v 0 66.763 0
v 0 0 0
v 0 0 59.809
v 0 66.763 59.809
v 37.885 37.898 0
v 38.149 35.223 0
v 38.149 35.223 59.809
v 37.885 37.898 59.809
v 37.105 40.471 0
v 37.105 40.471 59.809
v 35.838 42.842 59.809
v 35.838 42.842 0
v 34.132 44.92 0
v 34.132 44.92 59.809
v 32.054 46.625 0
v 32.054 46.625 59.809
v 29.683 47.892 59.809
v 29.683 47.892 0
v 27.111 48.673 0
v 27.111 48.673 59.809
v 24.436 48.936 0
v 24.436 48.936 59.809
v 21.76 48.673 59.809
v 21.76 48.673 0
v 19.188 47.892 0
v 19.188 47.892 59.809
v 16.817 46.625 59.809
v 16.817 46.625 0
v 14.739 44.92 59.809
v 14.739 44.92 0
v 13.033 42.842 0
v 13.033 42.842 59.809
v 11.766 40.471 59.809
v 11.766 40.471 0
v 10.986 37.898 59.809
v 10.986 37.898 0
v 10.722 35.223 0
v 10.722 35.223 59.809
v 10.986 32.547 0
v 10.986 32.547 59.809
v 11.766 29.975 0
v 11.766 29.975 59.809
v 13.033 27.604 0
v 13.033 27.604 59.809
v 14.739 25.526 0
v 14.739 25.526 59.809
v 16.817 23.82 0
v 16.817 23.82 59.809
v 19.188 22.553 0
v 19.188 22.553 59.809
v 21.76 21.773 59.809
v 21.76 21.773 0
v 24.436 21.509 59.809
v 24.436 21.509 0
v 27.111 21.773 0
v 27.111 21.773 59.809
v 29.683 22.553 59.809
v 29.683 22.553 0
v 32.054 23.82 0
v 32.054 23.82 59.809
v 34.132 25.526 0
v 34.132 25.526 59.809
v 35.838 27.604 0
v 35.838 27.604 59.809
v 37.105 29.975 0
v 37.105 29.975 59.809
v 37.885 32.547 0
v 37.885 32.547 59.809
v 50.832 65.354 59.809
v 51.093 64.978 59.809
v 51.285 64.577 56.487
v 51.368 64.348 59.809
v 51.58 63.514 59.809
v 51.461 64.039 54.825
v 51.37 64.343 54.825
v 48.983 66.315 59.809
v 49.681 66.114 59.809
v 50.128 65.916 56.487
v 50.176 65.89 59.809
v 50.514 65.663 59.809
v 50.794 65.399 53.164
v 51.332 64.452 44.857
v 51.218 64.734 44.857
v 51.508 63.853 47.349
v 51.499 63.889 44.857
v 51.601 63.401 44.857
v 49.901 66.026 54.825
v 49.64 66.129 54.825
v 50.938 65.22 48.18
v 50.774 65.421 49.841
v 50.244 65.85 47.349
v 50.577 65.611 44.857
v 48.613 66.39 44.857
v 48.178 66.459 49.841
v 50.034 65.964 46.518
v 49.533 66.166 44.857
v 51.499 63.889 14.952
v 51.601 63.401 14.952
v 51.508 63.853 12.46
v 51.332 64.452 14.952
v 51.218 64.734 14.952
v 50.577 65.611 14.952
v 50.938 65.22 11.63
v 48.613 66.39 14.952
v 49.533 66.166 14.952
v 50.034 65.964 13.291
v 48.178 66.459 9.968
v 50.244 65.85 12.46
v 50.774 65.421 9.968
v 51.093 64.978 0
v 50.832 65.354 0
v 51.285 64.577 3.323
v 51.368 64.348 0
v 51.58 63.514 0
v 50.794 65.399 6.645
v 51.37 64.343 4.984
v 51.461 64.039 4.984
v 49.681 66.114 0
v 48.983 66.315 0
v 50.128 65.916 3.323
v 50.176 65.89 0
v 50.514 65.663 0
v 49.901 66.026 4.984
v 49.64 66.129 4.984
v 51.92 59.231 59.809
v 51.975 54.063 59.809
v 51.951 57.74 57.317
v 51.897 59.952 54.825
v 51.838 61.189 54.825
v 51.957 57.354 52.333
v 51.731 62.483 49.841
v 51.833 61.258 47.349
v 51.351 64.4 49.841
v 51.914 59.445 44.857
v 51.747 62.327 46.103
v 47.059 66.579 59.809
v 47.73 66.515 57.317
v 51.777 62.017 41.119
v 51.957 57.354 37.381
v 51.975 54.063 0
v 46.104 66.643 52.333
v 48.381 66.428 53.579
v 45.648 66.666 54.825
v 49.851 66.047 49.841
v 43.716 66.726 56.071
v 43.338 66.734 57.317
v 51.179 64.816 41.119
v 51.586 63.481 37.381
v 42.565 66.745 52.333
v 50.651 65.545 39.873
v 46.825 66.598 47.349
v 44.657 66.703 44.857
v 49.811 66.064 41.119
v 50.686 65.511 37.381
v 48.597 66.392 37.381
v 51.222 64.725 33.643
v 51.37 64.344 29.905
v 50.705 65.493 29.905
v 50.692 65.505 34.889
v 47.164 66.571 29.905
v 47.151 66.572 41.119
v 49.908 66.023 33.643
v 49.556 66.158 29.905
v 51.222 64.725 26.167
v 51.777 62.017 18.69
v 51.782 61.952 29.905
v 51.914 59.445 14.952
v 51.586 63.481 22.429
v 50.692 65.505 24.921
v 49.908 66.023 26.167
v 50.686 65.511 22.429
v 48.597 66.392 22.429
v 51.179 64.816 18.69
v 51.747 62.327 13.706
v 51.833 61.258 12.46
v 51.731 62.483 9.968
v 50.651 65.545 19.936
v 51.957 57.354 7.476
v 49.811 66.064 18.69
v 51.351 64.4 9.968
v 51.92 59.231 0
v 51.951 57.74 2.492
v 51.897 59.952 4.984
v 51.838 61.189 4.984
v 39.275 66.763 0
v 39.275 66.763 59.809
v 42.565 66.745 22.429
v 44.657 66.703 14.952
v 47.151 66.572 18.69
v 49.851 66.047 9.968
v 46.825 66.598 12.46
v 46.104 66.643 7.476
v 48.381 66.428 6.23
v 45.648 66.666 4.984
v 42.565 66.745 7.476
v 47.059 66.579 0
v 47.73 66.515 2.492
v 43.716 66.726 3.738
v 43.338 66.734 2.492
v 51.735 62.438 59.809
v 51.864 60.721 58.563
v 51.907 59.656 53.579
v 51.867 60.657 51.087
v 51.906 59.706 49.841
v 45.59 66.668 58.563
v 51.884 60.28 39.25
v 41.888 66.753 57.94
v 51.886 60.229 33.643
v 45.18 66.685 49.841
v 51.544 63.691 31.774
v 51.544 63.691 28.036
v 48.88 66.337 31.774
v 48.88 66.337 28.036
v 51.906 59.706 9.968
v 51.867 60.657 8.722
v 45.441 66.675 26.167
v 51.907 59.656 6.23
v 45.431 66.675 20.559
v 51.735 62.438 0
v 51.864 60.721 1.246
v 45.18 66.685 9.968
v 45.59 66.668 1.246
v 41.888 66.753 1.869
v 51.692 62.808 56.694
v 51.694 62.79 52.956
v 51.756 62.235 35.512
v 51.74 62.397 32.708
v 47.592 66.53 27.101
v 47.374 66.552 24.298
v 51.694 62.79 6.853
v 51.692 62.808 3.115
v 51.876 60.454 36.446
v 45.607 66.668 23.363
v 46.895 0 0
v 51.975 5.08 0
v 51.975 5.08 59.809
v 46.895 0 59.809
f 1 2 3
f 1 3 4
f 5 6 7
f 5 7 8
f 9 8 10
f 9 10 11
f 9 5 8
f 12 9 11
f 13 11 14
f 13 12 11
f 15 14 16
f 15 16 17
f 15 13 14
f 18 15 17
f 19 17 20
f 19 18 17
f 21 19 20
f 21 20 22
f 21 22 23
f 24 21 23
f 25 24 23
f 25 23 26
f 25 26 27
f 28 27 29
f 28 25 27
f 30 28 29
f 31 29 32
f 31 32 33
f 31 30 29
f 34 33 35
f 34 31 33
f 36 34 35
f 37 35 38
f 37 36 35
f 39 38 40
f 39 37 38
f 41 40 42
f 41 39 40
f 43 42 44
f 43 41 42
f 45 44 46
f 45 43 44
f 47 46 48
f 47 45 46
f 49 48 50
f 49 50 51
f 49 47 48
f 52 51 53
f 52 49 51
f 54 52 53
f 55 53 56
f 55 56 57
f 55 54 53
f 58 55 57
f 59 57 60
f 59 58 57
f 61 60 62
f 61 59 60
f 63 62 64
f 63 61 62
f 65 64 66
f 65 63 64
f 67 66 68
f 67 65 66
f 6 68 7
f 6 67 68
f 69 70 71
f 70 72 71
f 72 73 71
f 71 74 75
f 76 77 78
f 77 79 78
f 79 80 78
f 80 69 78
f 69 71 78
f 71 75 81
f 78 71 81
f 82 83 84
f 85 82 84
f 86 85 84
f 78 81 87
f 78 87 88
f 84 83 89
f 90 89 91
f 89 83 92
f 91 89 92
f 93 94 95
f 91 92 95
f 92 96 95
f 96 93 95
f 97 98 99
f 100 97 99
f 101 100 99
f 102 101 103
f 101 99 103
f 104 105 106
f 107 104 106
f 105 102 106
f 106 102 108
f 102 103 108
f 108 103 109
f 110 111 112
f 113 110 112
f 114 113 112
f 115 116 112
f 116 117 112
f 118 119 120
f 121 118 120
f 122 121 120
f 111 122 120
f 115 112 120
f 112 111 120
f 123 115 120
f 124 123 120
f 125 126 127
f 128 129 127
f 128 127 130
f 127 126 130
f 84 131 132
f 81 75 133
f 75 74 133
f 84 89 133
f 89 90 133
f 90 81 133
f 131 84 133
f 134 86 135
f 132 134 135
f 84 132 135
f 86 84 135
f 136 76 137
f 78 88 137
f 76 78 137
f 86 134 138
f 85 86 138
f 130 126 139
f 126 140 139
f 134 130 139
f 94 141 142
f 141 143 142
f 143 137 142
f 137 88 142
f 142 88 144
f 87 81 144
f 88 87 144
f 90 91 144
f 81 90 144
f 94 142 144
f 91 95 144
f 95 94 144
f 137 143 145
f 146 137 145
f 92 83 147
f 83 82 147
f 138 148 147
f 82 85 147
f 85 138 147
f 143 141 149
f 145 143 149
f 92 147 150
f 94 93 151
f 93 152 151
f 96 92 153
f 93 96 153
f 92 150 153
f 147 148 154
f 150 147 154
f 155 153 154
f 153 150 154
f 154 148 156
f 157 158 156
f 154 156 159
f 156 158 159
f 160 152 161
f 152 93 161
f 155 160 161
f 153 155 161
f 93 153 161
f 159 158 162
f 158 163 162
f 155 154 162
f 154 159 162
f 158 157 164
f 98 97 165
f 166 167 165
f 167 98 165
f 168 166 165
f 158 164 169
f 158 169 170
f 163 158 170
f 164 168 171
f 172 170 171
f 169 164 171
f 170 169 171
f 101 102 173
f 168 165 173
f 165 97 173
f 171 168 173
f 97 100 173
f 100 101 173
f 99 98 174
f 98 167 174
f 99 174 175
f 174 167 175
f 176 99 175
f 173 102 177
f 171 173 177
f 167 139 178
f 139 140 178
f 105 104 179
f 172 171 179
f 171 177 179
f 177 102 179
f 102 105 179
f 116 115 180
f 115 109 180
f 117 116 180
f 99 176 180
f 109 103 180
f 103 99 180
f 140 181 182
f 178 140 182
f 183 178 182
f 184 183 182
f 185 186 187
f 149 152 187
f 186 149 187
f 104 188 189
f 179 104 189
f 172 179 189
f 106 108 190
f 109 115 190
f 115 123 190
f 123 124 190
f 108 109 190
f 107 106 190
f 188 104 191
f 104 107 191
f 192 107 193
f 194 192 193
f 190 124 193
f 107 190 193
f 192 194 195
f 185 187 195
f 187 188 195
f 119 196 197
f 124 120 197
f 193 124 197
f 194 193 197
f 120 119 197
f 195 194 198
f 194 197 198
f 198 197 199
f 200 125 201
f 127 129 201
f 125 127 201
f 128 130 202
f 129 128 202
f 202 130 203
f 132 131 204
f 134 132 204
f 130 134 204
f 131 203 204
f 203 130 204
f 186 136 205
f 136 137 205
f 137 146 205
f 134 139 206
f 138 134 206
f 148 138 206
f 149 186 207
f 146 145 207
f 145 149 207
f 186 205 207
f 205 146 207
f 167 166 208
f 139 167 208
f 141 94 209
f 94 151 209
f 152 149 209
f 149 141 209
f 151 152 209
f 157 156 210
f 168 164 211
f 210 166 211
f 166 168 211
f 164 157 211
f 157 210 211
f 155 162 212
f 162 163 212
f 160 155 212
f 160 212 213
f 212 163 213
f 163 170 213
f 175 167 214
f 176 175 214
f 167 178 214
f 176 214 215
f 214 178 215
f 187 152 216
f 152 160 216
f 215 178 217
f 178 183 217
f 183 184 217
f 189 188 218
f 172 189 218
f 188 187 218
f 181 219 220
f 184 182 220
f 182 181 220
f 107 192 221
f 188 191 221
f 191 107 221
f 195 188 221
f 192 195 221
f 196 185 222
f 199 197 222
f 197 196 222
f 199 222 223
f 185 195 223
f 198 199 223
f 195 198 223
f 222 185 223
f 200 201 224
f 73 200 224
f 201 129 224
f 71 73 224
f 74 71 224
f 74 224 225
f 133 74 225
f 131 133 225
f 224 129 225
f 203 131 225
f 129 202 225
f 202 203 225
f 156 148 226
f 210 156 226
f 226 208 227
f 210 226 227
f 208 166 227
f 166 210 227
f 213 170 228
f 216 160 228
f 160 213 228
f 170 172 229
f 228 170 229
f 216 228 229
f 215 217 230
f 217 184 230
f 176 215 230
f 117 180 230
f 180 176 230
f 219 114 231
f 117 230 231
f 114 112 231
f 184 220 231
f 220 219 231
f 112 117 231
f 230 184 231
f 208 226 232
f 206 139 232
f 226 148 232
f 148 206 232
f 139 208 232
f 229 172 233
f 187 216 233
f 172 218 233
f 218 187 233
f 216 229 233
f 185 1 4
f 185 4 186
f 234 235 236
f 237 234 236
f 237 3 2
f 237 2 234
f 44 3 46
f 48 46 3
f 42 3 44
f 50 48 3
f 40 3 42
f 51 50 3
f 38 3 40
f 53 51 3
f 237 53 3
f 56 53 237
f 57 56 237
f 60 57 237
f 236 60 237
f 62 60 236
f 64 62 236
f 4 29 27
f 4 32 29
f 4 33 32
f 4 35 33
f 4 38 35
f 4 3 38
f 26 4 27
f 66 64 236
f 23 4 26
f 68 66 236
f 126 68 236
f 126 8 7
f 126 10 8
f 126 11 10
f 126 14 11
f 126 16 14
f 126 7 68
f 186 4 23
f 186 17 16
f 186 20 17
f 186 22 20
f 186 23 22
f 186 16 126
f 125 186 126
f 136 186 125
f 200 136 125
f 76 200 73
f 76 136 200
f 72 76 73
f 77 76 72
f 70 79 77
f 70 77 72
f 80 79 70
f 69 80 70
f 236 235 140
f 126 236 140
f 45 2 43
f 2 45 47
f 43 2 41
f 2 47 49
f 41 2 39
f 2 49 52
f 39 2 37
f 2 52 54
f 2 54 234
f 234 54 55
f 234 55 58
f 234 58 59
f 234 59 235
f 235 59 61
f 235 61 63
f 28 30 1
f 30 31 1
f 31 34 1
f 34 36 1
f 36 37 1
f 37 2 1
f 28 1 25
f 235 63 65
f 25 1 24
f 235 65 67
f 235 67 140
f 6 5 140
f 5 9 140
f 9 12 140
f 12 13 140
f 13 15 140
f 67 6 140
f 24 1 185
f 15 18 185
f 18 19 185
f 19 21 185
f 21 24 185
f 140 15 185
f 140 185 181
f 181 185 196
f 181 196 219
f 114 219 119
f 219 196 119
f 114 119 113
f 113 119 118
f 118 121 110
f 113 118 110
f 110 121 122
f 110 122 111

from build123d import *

# Parameters (mm, degrees)
F0_W        = 51.974568516
F0_H        = 66.7630434036
F0_R        = 13.7134635275
F1_DEPTH    = 59.80942
F2_SIZE     = 5.08
F3_T1_DEPTH = 123.30942


# Not quite as in the source:
# - a fillet or chamfer that OpenCascade refuses, or shapes differently, is made with other operations: its cross-section is extruded or revolved along the edge and cut away or added


with BuildPart() as f1:
    # F0 (on Top) → F1 (new body)
    with BuildSketch(Plane.XY):
        with Locations((25.987284258, 33.3815217018)):
            Rectangle(F0_W, F0_H)
        with Locations((24.4355015457, 35.2227129042)):
            Circle(F0_R, mode=Mode.SUBTRACT)
    extrude(amount=F1_DEPTH)

    # F2
    f2_edges = [f1.edges().sort_by_distance(p)[0] for p in [
        (51.974569, 0, 29.90471),
    ]]
    chamfer(f2_edges, length=F2_SIZE)

    # F3: fillet of radius 12.7 on 1 edges, made by hand

    # F3_s2 → F3_t1 (cut)
    with BuildSketch(Plane.XY.offset(-31.75)):
        with BuildLine():
            add(Edge.make_bspline(
                [(51.974568516, 54.0630434036), (51.974568516, 66.7630434036), (39.274568516, 66.7630434036)],
                knots=[0, 0, 0, 1, 1, 1], degree=2, weights=[1, 4, 1]))
            Line((39.274568516, 66.7630434036), (51.974568516, 66.7630434036))
            Line((51.974568516, 66.7630434036), (51.974568516, 54.0630434036))
        make_face()
    extrude(amount=F3_T1_DEPTH, mode=Mode.SUBTRACT)


solid = f1.part
